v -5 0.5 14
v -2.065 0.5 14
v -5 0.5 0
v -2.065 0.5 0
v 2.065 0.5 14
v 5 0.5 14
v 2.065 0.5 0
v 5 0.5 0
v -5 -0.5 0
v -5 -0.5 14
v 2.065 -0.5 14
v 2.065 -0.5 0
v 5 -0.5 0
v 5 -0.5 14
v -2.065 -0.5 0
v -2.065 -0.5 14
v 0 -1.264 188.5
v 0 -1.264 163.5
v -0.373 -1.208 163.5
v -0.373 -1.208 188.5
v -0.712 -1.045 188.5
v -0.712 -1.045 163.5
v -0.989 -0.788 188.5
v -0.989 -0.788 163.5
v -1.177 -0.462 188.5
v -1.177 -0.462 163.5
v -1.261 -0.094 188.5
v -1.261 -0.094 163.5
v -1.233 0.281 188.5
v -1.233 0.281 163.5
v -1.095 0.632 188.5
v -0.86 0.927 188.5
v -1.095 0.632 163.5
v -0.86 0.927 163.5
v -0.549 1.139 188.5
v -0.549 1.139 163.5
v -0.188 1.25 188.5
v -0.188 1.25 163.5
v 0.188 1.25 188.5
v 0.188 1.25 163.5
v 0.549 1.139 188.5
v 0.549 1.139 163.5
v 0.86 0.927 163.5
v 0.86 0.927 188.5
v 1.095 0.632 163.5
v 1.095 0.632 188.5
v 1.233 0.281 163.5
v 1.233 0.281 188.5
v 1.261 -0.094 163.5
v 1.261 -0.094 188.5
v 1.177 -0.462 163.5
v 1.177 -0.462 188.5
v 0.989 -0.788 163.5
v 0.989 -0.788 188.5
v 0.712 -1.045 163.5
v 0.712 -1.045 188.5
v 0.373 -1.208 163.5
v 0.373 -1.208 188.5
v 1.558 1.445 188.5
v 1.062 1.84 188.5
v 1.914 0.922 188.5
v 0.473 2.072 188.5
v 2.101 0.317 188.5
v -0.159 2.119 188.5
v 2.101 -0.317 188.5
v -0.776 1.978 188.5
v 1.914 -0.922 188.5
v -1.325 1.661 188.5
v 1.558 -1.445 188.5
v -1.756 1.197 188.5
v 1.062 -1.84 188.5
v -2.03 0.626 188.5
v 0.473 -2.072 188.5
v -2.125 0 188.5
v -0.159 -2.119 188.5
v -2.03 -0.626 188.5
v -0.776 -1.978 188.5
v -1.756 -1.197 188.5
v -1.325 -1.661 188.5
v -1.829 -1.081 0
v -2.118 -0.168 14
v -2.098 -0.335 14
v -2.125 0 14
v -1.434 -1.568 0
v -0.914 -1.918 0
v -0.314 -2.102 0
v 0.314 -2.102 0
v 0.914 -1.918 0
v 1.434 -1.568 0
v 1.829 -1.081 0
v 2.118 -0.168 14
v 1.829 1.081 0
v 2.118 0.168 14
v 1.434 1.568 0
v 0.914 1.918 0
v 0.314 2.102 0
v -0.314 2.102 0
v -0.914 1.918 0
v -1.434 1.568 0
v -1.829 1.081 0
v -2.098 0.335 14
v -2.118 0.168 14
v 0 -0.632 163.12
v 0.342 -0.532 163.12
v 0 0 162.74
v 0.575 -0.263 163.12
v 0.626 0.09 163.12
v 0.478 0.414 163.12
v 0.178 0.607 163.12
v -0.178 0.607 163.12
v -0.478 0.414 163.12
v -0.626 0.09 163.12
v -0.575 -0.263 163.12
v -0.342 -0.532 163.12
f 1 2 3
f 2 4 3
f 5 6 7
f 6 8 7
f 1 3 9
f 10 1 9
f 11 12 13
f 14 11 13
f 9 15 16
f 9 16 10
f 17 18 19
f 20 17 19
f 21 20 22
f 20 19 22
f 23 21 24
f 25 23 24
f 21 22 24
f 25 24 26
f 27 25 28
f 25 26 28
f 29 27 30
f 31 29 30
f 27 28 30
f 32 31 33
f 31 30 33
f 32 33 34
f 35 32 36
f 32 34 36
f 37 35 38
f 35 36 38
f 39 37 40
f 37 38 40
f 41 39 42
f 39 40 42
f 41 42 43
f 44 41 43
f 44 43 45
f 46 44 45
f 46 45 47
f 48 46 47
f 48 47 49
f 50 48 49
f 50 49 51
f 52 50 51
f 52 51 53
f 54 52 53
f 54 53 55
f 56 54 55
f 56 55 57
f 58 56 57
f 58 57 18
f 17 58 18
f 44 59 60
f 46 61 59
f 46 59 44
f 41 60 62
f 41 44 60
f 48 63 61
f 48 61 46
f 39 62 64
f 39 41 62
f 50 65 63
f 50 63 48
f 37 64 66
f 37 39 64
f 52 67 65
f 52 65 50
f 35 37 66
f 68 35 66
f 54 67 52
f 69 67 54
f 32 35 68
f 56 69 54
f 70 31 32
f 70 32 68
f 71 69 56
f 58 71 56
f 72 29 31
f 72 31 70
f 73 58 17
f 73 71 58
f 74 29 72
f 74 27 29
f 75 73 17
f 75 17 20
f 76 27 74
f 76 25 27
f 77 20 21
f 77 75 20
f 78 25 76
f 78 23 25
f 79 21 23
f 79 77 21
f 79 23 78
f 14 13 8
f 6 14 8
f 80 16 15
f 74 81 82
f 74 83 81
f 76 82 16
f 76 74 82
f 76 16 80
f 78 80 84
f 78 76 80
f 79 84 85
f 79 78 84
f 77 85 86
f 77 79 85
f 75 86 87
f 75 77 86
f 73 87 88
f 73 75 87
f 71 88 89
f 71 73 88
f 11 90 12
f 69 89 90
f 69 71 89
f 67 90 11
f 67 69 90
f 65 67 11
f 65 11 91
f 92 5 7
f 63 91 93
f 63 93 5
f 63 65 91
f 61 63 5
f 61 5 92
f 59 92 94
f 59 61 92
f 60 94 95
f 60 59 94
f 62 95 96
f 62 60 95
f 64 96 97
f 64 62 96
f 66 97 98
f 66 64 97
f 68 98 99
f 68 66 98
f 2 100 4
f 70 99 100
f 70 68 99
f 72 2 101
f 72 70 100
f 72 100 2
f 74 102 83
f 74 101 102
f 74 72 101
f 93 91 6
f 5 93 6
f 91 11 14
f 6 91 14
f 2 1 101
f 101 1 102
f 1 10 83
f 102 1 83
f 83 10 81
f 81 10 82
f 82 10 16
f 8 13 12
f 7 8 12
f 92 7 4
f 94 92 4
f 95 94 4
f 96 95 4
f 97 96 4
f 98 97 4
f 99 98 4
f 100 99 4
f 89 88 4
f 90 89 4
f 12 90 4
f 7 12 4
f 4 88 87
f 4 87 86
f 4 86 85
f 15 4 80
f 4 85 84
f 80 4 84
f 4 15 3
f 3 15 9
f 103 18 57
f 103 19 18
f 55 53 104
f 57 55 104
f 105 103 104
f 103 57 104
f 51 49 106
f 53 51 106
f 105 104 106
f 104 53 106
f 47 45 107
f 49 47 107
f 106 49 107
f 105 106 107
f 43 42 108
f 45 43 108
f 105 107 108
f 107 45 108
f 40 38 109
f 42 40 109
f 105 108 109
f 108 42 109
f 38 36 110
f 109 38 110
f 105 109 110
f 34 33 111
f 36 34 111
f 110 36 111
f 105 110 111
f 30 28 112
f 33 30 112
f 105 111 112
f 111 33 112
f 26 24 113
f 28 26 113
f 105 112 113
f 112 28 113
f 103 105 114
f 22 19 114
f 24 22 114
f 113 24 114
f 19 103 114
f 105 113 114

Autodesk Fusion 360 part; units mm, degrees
sketch "Sketch1" plane through (0, 0, 0) normal (0, 1, 0) x (1, 0, 0)
  line L0 (0, 0) -> (0, -188.5)
  line L1 (0, 0) -> (-0.6248, 0)
  line L2 (-0.6248, 0) -> (-2.1248, 0)
  line L3 (-2.1248, 0) -> (-2.1248, -188.5)
  line L4 (-2.1248, -188.5) -> (0, -188.5)
  dimension "d1" = 188.5
  dimension "d2" = 1.5
revolve "Revolve1" add sketch "Sketch1" angle 360 about axis through (0, 0, 0) along (0, 0, 1)
sketch "Sketch2" plane through (0, 0, 0) normal (0, 0, -1) x (1, 0, 0)
  circle A0 centre (0, 0) radius 2.1248
  line L0 (0, 0.5) -> (-3, 0.5)
  line L1 (0, 0.5) -> (3.7205, 0.5)
  line L2 (3.7205, -0.5) -> (-3, -0.5)
  line L3 (0, 0.5) -> (5, 0.5)
  line L4 (5, 0.5) -> (5, -0.5)
  line L5 (5, -0.5) -> (-5, -0.5)
  line L6 (-5, -0.5) -> (-5, 0.5)
  line L7 (-5, 0.5) -> (-5.1, 0.5)
  line L8 (-5, 0.5) -> (5, 0.5)
  dimension "d4" = 0.5
extrude "Extrude2" add sketch "Sketch2" against normal blind 14 contours A0 L0 L2 L5 L6 L8
extrude "Extrude1" add sketch "Sketch2" against normal blind 14 contours A0 L1 L2 L3 L4 L5 L8
hole "Hole1" at (0, 0, 188.5) direction (0, 0, -1) diameter 2.529 depth 25 tip angle 118
